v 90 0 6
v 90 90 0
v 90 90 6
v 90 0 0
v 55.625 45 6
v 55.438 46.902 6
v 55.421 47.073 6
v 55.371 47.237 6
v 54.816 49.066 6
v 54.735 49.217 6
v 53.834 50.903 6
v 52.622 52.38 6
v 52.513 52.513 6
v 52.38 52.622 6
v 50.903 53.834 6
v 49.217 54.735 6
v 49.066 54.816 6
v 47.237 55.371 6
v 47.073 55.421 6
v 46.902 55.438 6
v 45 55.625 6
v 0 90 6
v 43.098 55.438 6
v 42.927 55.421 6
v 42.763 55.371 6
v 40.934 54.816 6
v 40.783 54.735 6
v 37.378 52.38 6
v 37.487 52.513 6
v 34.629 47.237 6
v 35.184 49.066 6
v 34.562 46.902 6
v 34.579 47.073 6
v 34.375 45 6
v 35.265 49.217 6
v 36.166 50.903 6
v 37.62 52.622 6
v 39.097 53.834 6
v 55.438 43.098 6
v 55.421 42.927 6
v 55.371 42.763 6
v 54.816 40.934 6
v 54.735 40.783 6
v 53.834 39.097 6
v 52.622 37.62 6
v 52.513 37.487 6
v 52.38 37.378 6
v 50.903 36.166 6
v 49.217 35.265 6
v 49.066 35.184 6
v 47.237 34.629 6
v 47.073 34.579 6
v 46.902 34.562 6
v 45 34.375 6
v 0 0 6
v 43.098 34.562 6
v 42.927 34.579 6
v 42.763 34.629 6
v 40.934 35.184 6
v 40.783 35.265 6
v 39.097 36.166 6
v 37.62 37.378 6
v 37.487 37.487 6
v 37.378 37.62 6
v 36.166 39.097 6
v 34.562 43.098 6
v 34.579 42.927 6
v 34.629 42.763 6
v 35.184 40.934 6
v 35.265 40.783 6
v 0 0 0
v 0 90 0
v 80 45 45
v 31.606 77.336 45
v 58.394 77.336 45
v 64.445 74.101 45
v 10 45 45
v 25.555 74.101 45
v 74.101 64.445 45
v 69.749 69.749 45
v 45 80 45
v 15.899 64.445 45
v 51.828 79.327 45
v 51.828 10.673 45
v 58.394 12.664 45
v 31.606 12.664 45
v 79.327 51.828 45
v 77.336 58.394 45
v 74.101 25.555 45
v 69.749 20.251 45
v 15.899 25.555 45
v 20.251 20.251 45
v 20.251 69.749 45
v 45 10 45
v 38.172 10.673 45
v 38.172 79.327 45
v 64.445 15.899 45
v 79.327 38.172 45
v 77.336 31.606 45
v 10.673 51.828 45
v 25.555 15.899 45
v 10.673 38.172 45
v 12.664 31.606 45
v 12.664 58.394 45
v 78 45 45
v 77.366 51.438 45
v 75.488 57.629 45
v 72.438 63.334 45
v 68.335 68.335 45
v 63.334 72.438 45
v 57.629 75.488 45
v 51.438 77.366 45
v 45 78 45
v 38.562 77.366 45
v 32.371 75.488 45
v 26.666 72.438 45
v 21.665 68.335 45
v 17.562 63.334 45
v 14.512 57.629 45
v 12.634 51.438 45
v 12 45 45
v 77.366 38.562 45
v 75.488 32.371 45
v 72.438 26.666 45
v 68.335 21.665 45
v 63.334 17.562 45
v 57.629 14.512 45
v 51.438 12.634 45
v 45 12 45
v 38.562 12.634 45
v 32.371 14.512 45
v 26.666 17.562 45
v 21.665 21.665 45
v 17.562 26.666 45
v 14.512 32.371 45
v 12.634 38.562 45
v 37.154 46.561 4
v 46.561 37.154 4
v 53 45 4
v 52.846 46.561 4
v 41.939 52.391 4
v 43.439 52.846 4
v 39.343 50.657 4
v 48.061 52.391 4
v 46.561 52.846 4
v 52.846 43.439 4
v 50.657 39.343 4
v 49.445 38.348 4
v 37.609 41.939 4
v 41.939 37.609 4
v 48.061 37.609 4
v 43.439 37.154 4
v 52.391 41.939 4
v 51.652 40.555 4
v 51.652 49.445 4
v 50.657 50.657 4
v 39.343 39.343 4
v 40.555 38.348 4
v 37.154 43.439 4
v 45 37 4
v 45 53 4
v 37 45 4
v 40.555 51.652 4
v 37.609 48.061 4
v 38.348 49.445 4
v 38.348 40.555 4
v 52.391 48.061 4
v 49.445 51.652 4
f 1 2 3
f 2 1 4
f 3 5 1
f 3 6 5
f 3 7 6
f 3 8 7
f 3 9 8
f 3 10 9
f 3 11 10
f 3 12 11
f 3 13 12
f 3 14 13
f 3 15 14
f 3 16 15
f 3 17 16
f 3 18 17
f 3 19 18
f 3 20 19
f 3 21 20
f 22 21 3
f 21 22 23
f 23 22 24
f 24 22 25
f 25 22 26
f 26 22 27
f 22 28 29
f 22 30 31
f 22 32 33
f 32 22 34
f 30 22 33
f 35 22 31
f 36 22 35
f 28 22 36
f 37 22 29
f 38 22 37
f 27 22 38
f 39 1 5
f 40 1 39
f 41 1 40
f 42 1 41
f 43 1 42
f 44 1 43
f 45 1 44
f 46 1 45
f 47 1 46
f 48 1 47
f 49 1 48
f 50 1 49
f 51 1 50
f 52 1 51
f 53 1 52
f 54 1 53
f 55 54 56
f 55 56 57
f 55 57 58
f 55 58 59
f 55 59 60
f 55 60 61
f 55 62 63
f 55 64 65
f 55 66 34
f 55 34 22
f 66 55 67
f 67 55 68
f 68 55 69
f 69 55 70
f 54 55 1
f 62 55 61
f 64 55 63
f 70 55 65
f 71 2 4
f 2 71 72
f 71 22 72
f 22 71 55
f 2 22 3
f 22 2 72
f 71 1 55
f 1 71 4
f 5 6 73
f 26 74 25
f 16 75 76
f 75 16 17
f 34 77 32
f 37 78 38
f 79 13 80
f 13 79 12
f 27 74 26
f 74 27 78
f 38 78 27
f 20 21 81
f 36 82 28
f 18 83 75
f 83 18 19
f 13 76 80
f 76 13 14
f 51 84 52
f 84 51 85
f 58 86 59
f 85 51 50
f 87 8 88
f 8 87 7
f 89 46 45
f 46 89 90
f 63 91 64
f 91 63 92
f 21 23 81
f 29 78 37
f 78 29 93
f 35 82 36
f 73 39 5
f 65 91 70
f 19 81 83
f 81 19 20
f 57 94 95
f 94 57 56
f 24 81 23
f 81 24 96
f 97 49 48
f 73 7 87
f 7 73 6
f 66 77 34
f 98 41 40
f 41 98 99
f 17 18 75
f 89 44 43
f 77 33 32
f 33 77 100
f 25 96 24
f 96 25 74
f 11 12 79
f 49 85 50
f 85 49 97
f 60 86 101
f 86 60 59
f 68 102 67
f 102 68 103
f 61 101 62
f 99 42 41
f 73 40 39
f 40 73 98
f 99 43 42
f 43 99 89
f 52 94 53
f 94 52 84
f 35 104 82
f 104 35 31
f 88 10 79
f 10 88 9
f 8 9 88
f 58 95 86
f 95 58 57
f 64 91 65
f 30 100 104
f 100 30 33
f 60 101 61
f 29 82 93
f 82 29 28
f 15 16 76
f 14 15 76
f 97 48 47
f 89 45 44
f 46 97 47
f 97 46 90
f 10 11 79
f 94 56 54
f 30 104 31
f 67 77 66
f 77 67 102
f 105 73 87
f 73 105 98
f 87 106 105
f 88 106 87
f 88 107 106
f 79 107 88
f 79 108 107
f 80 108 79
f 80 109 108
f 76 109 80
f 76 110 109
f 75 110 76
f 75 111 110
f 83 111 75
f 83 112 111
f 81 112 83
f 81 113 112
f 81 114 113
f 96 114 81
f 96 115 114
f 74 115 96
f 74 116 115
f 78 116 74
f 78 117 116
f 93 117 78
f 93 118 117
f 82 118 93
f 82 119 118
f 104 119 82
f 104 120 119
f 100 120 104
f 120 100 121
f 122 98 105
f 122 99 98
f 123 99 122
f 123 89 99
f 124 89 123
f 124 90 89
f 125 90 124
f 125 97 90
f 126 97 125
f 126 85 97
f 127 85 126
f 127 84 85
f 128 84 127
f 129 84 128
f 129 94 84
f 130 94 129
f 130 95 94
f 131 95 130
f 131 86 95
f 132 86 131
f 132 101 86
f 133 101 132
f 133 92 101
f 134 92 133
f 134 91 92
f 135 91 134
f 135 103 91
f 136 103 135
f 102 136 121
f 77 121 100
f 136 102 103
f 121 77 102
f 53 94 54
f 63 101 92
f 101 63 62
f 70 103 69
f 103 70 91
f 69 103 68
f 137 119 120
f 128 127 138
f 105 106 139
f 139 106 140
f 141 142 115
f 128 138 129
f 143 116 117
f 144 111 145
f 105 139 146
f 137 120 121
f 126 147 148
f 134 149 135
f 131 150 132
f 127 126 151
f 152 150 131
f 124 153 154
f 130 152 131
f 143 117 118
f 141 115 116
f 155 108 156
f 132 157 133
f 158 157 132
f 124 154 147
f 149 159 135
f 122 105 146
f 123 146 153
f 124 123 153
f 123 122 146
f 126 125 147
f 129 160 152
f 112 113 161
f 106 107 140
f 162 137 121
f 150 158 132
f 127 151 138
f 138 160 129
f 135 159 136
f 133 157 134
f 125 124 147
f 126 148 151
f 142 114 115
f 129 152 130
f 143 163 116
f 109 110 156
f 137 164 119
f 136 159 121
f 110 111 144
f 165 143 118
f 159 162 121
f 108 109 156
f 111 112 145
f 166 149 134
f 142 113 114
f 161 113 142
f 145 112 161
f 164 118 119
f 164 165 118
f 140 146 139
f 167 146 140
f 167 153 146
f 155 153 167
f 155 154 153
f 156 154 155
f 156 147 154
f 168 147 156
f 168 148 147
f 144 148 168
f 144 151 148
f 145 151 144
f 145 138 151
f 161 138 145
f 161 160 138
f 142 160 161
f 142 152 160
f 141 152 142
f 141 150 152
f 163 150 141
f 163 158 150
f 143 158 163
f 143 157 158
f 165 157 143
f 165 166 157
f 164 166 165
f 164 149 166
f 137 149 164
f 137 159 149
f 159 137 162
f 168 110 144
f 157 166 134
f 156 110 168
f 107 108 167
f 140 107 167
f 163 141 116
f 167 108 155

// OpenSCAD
$fn = 32;

// ----------------------------------------------------------------------
// Hopper: funnel with square flange
// ----------------------------------------------------------------------

// --- parameters (mm) ---
fl = 90;                  // flange side, X and Y
fl_t = 6;                 // flange thickness
cone_h = 40;              // cone height above the flange
top_d = 70;               // cone mouth diameter
bot_d = 20;               // cone spout diameter
wall = 2;                 // cone wall thickness

bore_d = bot_d - 2 * wall;  // spout bore diameter
total_h = fl_t + cone_h - 1;  // overall height

difference() {
  union() {
    cube([fl, fl, fl_t]);
    translate([fl / 2, fl / 2, fl_t - 1])
      cylinder(h = cone_h, d1 = bot_d, d2 = top_d);
  }
  translate([fl / 2, fl / 2, fl_t - 2])
    cylinder(h = cone_h + 1, d1 = bore_d, d2 = top_d - 2 * wall);
}
